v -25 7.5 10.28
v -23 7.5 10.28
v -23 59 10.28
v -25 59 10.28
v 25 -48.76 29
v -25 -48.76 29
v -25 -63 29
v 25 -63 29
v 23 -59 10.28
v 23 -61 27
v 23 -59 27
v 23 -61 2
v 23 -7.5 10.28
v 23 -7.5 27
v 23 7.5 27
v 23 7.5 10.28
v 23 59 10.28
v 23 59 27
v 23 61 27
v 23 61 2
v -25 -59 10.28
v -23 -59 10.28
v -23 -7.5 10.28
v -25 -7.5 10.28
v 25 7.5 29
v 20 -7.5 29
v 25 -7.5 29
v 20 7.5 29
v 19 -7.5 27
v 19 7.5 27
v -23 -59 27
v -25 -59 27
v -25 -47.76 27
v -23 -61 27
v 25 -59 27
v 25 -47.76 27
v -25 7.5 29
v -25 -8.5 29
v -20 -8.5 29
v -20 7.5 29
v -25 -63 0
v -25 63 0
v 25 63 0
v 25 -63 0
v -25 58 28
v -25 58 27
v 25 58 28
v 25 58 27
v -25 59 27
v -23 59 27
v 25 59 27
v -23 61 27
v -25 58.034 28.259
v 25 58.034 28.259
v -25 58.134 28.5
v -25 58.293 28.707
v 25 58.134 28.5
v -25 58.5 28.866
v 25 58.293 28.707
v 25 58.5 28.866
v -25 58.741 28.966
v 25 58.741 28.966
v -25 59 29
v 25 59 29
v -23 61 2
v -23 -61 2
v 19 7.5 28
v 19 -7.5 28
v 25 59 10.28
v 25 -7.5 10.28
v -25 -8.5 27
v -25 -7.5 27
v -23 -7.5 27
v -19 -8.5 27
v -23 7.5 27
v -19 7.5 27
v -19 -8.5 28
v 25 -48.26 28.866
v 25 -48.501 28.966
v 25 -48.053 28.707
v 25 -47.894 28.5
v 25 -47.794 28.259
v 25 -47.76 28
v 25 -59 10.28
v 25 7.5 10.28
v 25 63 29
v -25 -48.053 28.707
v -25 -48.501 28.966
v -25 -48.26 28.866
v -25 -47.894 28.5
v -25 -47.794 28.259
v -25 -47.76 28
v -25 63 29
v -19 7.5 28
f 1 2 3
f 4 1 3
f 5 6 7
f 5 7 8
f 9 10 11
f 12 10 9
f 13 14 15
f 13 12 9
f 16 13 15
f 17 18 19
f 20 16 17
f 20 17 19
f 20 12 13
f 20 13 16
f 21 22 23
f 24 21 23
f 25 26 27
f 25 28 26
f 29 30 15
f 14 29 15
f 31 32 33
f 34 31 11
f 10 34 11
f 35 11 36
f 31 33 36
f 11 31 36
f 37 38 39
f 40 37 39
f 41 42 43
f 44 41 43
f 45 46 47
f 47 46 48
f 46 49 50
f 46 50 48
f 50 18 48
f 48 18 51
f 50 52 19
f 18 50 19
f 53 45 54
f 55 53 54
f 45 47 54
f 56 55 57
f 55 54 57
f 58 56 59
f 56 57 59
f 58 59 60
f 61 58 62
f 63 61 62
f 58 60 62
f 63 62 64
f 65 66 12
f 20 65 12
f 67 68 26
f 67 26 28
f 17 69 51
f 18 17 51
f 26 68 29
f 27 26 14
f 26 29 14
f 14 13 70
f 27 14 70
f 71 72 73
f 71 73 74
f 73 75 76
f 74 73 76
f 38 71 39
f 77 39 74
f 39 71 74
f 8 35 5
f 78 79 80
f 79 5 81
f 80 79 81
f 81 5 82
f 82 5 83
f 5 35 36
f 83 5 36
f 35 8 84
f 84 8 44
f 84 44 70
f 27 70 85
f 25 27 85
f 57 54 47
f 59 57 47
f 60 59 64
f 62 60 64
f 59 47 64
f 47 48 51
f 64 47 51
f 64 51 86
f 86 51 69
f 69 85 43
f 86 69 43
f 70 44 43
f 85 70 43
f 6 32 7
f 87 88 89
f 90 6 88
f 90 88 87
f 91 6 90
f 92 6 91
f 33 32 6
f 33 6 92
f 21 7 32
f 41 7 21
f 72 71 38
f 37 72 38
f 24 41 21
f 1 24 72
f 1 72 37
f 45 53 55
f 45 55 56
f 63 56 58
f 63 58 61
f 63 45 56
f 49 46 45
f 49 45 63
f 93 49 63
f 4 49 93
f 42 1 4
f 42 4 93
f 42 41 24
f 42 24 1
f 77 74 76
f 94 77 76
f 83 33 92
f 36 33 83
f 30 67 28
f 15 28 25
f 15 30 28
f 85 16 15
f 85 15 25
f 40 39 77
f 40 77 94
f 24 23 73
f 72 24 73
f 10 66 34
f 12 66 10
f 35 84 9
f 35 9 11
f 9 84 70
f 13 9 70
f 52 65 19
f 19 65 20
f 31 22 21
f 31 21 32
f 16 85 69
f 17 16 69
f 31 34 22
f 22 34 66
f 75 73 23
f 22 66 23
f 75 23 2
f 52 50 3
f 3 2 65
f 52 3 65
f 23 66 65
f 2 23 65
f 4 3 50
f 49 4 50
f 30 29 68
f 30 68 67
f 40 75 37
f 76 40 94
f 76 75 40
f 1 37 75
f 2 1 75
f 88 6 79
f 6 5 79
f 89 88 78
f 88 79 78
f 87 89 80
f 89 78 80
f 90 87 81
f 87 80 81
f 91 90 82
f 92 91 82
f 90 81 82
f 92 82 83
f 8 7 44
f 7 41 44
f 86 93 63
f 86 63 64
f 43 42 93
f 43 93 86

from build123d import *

# Parameters (mm, degrees)
SKETCH_W        = 50
SKETCH_H        = 126
PAD_DEPTH       = 27
THICKNESS_T     = -2
SKETCH001_W     = 51.5
SKETCH001_H     = 16.72
POCKET_DEPTH    = 50.001
SKETCH002_W     = 50
SKETCH002_H     = 15.24
PAD001_DEPTH    = 2
SKETCH003_W     = 50
SKETCH003_H     = 5
PAD002_DEPTH    = 2
SKETCH004_W     = 6
SKETCH004_H     = 15
PAD003_DEPTH    = 2
SKETCH005_W     = 6
SKETCH005_H     = 16
PAD004_DEPTH    = 2
CHAMFER_SIZE    = 1
CHAMFER001_SIZE = 1
FILLET_R        = 1
FILLET001_R     = 1


with BuildPart() as part:
    # Sketch → Pad (new body)
    with BuildSketch(Plane.XY):
        Rectangle(SKETCH_W, SKETCH_H)
    extrude(amount=PAD_DEPTH)

    # Thickness
    thickness_openings = [part.faces().sort_by_distance(p)[0] for p in [
        (0, 0, 27),
    ]]
    offset(amount=THICKNESS_T, openings=thickness_openings)

    # Sketch001 (on Face3 of Thickness) → Pocket (cut, through all)
    with BuildSketch(Plane.YZ.offset(25)):
        with Locations((-33.25, 18.64)):
            Rectangle(SKETCH001_W, SKETCH001_H)
        with Locations((33.25, 18.64)):
            Rectangle(SKETCH001_W, SKETCH001_H)
    extrude(amount=-POCKET_DEPTH, mode=Mode.SUBTRACT)

    # Sketch002 (on Face4 of Pocket) → Pad001 (join)
    with BuildSketch(Plane.XY.offset(27)):
        with Locations((0, -55.38)):
            Rectangle(SKETCH002_W, SKETCH002_H)
    extrude(amount=PAD001_DEPTH)

    # Sketch003 (on Face12 of Pad001) → Pad002 (join)
    with BuildSketch(Plane.XY.offset(27)):
        with Locations((0, 60.5)):
            Rectangle(SKETCH003_W, SKETCH003_H)
    extrude(amount=PAD002_DEPTH)

    # Sketch004 (on Face6 of Pad002) → Pad003 (join)
    with BuildSketch(Plane.XY.offset(27)):
        with Locations((22, 0)):
            Rectangle(SKETCH004_W, SKETCH004_H)
    extrude(amount=PAD003_DEPTH)

    # Sketch005 (on Face13 of Pad003) → Pad004 (join)
    with BuildSketch(Plane.XY.offset(27)):
        with Locations((-22, -0.5)):
            Rectangle(SKETCH005_W, SKETCH005_H)
    extrude(amount=PAD004_DEPTH)

    # Chamfer
    chamfer_edges = [part.edges().sort_by_distance(p)[0] for p in [
        (-19, -0.5, 29),
    ]]
    chamfer(chamfer_edges, length=CHAMFER_SIZE)

    # Chamfer001
    chamfer001_edges = [part.edges().sort_by_distance(p)[0] for p in [
        (19, 0, 29),
    ]]
    chamfer(chamfer001_edges, length=CHAMFER001_SIZE)

    # Fillet
    fillet_edges = [part.edges().sort_by_distance(p)[0] for p in [
        (0, 58, 29),
    ]]
    fillet(fillet_edges, radius=FILLET_R)

    # Fillet001
    fillet001_edges = [part.edges().sort_by_distance(p)[0] for p in [
        (0, -47.76, 29),
    ]]
    fillet(fillet001_edges, radius=FILLET001_R)


solid = part.part
